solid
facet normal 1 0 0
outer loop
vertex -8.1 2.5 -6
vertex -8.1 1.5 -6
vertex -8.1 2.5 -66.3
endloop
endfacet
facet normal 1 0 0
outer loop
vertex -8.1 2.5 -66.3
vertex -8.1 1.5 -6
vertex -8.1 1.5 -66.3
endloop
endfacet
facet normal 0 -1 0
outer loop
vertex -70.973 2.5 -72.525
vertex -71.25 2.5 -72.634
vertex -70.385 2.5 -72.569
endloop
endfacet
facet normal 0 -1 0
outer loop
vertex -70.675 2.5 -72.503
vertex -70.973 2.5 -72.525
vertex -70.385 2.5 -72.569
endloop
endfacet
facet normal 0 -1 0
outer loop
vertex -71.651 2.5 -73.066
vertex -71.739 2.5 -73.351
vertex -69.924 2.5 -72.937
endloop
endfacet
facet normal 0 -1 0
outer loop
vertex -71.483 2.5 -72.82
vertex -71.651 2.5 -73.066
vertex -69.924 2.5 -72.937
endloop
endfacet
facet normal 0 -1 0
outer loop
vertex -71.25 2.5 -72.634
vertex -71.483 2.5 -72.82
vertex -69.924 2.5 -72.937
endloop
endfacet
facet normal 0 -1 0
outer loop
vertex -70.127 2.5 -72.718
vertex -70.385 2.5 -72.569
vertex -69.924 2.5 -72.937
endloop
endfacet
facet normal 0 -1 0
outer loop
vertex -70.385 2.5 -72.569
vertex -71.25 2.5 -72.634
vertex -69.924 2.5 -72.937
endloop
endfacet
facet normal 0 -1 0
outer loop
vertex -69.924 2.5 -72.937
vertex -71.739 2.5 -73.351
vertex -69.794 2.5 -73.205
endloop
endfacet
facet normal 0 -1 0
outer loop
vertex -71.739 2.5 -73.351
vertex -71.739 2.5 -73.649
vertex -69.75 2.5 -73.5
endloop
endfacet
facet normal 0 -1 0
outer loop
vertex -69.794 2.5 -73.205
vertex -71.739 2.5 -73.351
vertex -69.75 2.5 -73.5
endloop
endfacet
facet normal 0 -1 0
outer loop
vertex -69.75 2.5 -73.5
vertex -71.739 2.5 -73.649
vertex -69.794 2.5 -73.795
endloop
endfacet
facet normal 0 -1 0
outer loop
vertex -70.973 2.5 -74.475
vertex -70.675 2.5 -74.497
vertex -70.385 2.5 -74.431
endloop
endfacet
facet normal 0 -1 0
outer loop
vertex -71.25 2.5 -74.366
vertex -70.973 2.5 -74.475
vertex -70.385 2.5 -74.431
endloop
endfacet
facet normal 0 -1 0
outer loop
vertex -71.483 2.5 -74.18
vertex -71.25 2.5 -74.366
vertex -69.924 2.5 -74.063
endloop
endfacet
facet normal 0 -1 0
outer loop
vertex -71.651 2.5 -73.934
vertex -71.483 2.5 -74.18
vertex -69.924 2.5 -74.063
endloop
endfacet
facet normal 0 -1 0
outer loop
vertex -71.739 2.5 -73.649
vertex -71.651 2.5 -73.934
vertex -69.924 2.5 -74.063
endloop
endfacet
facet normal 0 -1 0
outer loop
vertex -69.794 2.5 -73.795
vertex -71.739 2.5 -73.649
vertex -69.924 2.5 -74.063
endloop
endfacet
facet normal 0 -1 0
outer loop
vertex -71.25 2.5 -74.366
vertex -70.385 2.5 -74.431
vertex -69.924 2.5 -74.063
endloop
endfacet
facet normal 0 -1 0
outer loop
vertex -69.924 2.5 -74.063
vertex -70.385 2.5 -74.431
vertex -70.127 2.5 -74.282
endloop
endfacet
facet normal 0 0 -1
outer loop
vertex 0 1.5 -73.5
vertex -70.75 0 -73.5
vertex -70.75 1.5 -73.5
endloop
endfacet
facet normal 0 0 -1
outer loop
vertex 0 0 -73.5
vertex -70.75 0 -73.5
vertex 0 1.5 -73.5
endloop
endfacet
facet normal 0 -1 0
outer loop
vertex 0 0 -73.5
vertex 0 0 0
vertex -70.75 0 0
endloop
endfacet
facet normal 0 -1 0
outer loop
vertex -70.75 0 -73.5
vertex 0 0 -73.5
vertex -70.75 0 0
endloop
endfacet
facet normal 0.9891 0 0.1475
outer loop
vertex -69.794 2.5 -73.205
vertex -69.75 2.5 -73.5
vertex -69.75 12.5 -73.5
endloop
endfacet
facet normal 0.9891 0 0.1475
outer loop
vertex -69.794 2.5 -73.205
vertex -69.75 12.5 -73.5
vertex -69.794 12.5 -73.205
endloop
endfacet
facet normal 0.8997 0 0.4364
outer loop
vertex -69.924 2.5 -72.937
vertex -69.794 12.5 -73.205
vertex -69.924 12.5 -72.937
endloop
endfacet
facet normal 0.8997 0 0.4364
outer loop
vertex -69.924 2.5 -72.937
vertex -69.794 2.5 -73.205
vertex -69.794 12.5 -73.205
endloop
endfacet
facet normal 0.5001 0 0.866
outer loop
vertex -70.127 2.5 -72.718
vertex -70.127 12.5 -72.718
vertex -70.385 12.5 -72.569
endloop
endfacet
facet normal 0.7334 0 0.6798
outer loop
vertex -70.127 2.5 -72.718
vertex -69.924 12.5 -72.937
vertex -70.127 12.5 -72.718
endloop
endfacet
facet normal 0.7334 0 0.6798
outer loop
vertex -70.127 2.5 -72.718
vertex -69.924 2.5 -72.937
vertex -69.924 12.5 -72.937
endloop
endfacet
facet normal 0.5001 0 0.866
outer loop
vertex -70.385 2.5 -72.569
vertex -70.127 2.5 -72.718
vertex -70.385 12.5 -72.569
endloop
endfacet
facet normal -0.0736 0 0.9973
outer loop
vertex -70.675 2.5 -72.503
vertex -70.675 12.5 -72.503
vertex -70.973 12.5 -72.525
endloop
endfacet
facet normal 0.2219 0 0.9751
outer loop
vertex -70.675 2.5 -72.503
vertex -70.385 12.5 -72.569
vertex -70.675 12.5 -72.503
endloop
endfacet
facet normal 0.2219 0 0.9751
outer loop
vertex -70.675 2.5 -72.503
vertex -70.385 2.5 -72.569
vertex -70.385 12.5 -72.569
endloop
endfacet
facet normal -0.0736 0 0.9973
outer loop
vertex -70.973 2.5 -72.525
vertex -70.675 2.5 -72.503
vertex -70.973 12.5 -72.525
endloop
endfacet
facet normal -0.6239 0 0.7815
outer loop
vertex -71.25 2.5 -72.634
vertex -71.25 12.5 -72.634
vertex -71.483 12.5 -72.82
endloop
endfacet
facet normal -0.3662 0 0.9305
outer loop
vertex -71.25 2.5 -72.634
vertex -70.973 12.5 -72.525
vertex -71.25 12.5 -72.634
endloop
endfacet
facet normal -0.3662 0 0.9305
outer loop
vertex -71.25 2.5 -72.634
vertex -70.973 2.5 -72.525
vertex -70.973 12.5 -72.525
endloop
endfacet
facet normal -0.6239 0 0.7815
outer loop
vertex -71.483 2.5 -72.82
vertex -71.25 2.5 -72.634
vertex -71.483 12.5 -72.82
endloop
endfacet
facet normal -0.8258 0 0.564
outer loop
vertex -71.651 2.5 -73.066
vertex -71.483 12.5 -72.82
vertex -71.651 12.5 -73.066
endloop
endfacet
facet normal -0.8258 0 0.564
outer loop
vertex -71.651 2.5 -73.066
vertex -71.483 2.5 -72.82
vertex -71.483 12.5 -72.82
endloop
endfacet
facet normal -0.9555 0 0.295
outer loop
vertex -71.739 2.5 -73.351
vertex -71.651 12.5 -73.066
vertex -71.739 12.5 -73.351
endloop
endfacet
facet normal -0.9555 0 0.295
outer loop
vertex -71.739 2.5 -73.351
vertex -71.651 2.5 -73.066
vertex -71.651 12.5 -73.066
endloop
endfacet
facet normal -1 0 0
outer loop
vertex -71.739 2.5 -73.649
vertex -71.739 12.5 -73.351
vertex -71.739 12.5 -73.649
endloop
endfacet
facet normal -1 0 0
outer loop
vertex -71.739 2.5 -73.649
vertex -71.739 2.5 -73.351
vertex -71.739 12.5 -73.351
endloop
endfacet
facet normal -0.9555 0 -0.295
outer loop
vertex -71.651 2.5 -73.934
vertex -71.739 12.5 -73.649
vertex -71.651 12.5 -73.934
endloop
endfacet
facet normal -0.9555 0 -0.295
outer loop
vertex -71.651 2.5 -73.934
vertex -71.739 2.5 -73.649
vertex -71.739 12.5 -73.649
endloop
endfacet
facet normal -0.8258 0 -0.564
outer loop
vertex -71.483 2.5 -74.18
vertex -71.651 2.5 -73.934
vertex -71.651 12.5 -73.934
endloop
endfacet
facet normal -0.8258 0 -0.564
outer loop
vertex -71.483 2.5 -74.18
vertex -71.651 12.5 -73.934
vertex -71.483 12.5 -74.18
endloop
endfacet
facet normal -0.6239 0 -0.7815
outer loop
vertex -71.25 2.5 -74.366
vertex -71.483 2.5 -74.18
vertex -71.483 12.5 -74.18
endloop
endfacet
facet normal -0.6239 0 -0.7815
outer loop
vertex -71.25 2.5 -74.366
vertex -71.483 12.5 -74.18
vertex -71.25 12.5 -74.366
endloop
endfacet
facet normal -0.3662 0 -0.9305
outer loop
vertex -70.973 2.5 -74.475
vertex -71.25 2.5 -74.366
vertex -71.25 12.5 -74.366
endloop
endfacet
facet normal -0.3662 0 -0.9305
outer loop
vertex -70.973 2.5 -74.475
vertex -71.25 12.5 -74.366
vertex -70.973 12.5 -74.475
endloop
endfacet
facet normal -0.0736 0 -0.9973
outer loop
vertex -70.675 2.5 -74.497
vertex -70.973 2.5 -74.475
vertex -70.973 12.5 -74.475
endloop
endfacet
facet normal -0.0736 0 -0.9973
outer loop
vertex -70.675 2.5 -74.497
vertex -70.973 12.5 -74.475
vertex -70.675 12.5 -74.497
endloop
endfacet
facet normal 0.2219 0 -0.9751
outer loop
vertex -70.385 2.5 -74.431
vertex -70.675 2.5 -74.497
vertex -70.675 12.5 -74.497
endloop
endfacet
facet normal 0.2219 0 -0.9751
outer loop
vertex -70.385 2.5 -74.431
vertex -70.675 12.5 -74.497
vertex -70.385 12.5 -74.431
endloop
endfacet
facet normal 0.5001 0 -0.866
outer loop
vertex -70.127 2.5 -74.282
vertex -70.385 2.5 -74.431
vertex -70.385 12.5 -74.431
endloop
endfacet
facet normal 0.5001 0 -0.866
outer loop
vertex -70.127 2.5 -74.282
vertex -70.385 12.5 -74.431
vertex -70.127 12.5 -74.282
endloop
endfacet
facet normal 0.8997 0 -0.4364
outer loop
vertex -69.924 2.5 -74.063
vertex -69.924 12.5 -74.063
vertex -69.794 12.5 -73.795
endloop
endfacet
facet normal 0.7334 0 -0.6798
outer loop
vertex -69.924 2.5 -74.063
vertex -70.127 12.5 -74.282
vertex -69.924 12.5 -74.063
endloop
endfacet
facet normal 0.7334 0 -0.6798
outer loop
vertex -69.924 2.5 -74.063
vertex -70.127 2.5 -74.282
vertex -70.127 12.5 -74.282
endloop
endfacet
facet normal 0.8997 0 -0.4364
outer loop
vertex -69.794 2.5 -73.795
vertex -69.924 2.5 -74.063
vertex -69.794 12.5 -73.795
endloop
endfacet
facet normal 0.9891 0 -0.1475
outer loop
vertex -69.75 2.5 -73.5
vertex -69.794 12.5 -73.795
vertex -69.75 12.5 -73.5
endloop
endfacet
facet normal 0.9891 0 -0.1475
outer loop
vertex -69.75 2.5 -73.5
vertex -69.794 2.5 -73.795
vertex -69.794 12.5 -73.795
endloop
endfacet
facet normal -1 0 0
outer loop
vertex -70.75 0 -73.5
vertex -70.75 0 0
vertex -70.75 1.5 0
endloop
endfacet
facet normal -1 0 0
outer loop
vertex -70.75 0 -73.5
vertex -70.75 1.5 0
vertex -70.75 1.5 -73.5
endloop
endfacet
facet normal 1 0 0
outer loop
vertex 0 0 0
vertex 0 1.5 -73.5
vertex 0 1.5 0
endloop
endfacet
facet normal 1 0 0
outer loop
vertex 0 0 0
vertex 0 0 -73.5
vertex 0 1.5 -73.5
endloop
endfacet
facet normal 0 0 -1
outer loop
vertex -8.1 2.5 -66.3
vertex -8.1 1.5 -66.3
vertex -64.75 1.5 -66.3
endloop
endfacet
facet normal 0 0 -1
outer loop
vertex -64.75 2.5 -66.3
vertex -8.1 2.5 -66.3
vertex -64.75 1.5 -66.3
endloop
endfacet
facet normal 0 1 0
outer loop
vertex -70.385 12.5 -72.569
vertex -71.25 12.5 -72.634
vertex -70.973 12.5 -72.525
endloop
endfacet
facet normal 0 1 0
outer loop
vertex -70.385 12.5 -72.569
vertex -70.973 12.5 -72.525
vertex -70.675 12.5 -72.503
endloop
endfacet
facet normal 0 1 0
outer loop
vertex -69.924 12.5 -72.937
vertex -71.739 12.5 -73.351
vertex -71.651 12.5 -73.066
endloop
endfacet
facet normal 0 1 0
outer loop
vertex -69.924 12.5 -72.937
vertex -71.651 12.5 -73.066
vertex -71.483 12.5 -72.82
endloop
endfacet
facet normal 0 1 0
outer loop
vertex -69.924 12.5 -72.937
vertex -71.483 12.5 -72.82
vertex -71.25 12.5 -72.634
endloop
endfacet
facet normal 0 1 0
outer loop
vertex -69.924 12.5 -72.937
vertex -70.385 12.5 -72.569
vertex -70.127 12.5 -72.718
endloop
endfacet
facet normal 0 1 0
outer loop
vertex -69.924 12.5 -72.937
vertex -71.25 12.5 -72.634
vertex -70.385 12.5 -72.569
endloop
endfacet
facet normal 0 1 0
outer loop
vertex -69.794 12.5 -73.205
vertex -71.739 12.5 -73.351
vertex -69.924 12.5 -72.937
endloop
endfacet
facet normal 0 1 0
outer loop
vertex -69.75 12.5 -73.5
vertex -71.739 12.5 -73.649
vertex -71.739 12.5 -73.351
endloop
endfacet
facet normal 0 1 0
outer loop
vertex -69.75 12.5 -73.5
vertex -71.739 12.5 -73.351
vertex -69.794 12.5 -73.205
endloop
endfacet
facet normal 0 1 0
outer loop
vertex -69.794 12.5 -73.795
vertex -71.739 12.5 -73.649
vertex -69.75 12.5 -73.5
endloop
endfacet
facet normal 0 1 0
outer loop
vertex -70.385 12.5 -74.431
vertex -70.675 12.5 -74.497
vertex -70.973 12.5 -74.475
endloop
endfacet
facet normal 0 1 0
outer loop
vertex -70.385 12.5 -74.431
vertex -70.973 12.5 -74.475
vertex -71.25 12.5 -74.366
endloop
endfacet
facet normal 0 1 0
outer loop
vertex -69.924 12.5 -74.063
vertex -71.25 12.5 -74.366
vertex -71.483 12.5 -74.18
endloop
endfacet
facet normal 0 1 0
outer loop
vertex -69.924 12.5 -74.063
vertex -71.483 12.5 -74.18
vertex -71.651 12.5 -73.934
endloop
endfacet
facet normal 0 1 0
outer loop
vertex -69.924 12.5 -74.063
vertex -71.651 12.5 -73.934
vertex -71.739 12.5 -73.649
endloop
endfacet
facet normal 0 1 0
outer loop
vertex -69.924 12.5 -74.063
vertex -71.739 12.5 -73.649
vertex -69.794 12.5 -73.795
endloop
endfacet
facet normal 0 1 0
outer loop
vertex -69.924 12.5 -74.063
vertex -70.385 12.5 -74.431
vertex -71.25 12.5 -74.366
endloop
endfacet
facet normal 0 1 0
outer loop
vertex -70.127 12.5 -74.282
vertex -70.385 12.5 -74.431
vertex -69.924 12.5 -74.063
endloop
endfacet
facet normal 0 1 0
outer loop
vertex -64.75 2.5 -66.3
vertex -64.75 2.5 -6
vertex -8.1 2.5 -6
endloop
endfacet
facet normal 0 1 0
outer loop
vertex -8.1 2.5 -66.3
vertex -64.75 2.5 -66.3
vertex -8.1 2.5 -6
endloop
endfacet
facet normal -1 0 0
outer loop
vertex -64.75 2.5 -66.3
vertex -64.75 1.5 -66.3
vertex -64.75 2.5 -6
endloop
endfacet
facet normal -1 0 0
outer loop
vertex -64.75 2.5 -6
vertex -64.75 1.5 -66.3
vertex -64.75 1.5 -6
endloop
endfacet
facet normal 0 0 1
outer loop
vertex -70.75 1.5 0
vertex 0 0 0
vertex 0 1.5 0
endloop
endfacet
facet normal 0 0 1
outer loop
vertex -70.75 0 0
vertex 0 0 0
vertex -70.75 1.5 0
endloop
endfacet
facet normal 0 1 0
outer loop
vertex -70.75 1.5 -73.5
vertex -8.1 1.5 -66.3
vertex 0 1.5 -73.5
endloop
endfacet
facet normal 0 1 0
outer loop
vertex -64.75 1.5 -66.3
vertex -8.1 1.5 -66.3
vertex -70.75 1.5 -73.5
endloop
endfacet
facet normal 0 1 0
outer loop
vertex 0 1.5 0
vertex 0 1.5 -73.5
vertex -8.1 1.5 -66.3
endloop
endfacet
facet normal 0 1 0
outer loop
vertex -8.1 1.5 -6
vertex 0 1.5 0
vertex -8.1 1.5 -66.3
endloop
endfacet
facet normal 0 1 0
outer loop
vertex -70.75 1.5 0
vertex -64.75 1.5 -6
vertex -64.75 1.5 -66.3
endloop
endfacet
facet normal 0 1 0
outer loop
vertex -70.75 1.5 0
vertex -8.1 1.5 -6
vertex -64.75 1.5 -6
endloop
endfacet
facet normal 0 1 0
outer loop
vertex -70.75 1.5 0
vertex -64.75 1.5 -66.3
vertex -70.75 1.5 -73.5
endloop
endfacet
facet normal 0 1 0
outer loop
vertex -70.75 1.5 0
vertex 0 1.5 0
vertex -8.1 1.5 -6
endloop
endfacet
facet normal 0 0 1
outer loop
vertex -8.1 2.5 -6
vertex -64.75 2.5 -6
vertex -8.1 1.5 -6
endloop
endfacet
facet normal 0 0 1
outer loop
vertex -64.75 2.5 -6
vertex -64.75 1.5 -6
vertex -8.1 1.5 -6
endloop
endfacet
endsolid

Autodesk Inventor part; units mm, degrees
ref_plane "YZ Plane" through (0, 0, 0) normal (1, 0, 0) x (0, 1, 0)
ref_plane "XZ Plane" through (0, 0, 0) normal (0, 1, 0) x (-1, 0, 0)
ref_plane "XY Plane" through (0, 0, 0) normal (0, 0, 1) x (1, 0, 0)
sketch "Sketch1" plane through (0, 0, 0) normal (0, 1, 0) x (-1, 0, 0)
  line L0 (0, 0) -> (70.75, 0)
  line L1 (70.75, 0) -> (70.75, -73.5)
  line L2 (70.75, -73.5) -> (0, -73.5)
  line L3 (0, -73.5) -> (0, 0)
  dimension "d0" = 73.5
  dimension "d1" = 70.75
extrude "Extrusion1" add sketch "Sketch1" along normal blind 1.5
sketch "Sketch2" plane through (0, 1.5, 0) normal (0, 1, 0) x (1, 0, 0)
  line L0 (-64.75, 6) -> (-8.1, 6)
  line L1 (-8.1, 6) -> (-8.1, 66.3)
  line L2 (-8.1, 66.3) -> (-64.75, 66.3)
  line L3 (-64.75, 66.3) -> (-64.75, 6)
  line L4 (0, 0) -> (0, 73.5) projected
  line L5 (0, 73.5) -> (-70.75, 73.5) projected
  line L6 (-70.75, 0) -> (0, 0) projected
  line L7 (-70.75, 73.5) -> (-70.75, 0) projected
  dimension "d4" = 8.1
  dimension "d5" = 7.2
  dimension "d6" = 6
  dimension "d7" = 6
extrude "Extrusion2" add sketch "Sketch2" along normal blind 1 contours L3 L2 L1 L0
sketch "Sketch3" plane through (0, 2.5, 0) normal (0, 1, 0) x (1, 0, 0)
  line L0 (0, 73.5) -> (-70.75, 73.5) projected
  circle A0 centre (-70.75, 73.5) radius 1
  point P0 (0, 0)
  dimension "d10" = 2
extrude "Extrusion3" add sketch "Sketch3" along normal blind 10
properties part number "PCBBoard"
